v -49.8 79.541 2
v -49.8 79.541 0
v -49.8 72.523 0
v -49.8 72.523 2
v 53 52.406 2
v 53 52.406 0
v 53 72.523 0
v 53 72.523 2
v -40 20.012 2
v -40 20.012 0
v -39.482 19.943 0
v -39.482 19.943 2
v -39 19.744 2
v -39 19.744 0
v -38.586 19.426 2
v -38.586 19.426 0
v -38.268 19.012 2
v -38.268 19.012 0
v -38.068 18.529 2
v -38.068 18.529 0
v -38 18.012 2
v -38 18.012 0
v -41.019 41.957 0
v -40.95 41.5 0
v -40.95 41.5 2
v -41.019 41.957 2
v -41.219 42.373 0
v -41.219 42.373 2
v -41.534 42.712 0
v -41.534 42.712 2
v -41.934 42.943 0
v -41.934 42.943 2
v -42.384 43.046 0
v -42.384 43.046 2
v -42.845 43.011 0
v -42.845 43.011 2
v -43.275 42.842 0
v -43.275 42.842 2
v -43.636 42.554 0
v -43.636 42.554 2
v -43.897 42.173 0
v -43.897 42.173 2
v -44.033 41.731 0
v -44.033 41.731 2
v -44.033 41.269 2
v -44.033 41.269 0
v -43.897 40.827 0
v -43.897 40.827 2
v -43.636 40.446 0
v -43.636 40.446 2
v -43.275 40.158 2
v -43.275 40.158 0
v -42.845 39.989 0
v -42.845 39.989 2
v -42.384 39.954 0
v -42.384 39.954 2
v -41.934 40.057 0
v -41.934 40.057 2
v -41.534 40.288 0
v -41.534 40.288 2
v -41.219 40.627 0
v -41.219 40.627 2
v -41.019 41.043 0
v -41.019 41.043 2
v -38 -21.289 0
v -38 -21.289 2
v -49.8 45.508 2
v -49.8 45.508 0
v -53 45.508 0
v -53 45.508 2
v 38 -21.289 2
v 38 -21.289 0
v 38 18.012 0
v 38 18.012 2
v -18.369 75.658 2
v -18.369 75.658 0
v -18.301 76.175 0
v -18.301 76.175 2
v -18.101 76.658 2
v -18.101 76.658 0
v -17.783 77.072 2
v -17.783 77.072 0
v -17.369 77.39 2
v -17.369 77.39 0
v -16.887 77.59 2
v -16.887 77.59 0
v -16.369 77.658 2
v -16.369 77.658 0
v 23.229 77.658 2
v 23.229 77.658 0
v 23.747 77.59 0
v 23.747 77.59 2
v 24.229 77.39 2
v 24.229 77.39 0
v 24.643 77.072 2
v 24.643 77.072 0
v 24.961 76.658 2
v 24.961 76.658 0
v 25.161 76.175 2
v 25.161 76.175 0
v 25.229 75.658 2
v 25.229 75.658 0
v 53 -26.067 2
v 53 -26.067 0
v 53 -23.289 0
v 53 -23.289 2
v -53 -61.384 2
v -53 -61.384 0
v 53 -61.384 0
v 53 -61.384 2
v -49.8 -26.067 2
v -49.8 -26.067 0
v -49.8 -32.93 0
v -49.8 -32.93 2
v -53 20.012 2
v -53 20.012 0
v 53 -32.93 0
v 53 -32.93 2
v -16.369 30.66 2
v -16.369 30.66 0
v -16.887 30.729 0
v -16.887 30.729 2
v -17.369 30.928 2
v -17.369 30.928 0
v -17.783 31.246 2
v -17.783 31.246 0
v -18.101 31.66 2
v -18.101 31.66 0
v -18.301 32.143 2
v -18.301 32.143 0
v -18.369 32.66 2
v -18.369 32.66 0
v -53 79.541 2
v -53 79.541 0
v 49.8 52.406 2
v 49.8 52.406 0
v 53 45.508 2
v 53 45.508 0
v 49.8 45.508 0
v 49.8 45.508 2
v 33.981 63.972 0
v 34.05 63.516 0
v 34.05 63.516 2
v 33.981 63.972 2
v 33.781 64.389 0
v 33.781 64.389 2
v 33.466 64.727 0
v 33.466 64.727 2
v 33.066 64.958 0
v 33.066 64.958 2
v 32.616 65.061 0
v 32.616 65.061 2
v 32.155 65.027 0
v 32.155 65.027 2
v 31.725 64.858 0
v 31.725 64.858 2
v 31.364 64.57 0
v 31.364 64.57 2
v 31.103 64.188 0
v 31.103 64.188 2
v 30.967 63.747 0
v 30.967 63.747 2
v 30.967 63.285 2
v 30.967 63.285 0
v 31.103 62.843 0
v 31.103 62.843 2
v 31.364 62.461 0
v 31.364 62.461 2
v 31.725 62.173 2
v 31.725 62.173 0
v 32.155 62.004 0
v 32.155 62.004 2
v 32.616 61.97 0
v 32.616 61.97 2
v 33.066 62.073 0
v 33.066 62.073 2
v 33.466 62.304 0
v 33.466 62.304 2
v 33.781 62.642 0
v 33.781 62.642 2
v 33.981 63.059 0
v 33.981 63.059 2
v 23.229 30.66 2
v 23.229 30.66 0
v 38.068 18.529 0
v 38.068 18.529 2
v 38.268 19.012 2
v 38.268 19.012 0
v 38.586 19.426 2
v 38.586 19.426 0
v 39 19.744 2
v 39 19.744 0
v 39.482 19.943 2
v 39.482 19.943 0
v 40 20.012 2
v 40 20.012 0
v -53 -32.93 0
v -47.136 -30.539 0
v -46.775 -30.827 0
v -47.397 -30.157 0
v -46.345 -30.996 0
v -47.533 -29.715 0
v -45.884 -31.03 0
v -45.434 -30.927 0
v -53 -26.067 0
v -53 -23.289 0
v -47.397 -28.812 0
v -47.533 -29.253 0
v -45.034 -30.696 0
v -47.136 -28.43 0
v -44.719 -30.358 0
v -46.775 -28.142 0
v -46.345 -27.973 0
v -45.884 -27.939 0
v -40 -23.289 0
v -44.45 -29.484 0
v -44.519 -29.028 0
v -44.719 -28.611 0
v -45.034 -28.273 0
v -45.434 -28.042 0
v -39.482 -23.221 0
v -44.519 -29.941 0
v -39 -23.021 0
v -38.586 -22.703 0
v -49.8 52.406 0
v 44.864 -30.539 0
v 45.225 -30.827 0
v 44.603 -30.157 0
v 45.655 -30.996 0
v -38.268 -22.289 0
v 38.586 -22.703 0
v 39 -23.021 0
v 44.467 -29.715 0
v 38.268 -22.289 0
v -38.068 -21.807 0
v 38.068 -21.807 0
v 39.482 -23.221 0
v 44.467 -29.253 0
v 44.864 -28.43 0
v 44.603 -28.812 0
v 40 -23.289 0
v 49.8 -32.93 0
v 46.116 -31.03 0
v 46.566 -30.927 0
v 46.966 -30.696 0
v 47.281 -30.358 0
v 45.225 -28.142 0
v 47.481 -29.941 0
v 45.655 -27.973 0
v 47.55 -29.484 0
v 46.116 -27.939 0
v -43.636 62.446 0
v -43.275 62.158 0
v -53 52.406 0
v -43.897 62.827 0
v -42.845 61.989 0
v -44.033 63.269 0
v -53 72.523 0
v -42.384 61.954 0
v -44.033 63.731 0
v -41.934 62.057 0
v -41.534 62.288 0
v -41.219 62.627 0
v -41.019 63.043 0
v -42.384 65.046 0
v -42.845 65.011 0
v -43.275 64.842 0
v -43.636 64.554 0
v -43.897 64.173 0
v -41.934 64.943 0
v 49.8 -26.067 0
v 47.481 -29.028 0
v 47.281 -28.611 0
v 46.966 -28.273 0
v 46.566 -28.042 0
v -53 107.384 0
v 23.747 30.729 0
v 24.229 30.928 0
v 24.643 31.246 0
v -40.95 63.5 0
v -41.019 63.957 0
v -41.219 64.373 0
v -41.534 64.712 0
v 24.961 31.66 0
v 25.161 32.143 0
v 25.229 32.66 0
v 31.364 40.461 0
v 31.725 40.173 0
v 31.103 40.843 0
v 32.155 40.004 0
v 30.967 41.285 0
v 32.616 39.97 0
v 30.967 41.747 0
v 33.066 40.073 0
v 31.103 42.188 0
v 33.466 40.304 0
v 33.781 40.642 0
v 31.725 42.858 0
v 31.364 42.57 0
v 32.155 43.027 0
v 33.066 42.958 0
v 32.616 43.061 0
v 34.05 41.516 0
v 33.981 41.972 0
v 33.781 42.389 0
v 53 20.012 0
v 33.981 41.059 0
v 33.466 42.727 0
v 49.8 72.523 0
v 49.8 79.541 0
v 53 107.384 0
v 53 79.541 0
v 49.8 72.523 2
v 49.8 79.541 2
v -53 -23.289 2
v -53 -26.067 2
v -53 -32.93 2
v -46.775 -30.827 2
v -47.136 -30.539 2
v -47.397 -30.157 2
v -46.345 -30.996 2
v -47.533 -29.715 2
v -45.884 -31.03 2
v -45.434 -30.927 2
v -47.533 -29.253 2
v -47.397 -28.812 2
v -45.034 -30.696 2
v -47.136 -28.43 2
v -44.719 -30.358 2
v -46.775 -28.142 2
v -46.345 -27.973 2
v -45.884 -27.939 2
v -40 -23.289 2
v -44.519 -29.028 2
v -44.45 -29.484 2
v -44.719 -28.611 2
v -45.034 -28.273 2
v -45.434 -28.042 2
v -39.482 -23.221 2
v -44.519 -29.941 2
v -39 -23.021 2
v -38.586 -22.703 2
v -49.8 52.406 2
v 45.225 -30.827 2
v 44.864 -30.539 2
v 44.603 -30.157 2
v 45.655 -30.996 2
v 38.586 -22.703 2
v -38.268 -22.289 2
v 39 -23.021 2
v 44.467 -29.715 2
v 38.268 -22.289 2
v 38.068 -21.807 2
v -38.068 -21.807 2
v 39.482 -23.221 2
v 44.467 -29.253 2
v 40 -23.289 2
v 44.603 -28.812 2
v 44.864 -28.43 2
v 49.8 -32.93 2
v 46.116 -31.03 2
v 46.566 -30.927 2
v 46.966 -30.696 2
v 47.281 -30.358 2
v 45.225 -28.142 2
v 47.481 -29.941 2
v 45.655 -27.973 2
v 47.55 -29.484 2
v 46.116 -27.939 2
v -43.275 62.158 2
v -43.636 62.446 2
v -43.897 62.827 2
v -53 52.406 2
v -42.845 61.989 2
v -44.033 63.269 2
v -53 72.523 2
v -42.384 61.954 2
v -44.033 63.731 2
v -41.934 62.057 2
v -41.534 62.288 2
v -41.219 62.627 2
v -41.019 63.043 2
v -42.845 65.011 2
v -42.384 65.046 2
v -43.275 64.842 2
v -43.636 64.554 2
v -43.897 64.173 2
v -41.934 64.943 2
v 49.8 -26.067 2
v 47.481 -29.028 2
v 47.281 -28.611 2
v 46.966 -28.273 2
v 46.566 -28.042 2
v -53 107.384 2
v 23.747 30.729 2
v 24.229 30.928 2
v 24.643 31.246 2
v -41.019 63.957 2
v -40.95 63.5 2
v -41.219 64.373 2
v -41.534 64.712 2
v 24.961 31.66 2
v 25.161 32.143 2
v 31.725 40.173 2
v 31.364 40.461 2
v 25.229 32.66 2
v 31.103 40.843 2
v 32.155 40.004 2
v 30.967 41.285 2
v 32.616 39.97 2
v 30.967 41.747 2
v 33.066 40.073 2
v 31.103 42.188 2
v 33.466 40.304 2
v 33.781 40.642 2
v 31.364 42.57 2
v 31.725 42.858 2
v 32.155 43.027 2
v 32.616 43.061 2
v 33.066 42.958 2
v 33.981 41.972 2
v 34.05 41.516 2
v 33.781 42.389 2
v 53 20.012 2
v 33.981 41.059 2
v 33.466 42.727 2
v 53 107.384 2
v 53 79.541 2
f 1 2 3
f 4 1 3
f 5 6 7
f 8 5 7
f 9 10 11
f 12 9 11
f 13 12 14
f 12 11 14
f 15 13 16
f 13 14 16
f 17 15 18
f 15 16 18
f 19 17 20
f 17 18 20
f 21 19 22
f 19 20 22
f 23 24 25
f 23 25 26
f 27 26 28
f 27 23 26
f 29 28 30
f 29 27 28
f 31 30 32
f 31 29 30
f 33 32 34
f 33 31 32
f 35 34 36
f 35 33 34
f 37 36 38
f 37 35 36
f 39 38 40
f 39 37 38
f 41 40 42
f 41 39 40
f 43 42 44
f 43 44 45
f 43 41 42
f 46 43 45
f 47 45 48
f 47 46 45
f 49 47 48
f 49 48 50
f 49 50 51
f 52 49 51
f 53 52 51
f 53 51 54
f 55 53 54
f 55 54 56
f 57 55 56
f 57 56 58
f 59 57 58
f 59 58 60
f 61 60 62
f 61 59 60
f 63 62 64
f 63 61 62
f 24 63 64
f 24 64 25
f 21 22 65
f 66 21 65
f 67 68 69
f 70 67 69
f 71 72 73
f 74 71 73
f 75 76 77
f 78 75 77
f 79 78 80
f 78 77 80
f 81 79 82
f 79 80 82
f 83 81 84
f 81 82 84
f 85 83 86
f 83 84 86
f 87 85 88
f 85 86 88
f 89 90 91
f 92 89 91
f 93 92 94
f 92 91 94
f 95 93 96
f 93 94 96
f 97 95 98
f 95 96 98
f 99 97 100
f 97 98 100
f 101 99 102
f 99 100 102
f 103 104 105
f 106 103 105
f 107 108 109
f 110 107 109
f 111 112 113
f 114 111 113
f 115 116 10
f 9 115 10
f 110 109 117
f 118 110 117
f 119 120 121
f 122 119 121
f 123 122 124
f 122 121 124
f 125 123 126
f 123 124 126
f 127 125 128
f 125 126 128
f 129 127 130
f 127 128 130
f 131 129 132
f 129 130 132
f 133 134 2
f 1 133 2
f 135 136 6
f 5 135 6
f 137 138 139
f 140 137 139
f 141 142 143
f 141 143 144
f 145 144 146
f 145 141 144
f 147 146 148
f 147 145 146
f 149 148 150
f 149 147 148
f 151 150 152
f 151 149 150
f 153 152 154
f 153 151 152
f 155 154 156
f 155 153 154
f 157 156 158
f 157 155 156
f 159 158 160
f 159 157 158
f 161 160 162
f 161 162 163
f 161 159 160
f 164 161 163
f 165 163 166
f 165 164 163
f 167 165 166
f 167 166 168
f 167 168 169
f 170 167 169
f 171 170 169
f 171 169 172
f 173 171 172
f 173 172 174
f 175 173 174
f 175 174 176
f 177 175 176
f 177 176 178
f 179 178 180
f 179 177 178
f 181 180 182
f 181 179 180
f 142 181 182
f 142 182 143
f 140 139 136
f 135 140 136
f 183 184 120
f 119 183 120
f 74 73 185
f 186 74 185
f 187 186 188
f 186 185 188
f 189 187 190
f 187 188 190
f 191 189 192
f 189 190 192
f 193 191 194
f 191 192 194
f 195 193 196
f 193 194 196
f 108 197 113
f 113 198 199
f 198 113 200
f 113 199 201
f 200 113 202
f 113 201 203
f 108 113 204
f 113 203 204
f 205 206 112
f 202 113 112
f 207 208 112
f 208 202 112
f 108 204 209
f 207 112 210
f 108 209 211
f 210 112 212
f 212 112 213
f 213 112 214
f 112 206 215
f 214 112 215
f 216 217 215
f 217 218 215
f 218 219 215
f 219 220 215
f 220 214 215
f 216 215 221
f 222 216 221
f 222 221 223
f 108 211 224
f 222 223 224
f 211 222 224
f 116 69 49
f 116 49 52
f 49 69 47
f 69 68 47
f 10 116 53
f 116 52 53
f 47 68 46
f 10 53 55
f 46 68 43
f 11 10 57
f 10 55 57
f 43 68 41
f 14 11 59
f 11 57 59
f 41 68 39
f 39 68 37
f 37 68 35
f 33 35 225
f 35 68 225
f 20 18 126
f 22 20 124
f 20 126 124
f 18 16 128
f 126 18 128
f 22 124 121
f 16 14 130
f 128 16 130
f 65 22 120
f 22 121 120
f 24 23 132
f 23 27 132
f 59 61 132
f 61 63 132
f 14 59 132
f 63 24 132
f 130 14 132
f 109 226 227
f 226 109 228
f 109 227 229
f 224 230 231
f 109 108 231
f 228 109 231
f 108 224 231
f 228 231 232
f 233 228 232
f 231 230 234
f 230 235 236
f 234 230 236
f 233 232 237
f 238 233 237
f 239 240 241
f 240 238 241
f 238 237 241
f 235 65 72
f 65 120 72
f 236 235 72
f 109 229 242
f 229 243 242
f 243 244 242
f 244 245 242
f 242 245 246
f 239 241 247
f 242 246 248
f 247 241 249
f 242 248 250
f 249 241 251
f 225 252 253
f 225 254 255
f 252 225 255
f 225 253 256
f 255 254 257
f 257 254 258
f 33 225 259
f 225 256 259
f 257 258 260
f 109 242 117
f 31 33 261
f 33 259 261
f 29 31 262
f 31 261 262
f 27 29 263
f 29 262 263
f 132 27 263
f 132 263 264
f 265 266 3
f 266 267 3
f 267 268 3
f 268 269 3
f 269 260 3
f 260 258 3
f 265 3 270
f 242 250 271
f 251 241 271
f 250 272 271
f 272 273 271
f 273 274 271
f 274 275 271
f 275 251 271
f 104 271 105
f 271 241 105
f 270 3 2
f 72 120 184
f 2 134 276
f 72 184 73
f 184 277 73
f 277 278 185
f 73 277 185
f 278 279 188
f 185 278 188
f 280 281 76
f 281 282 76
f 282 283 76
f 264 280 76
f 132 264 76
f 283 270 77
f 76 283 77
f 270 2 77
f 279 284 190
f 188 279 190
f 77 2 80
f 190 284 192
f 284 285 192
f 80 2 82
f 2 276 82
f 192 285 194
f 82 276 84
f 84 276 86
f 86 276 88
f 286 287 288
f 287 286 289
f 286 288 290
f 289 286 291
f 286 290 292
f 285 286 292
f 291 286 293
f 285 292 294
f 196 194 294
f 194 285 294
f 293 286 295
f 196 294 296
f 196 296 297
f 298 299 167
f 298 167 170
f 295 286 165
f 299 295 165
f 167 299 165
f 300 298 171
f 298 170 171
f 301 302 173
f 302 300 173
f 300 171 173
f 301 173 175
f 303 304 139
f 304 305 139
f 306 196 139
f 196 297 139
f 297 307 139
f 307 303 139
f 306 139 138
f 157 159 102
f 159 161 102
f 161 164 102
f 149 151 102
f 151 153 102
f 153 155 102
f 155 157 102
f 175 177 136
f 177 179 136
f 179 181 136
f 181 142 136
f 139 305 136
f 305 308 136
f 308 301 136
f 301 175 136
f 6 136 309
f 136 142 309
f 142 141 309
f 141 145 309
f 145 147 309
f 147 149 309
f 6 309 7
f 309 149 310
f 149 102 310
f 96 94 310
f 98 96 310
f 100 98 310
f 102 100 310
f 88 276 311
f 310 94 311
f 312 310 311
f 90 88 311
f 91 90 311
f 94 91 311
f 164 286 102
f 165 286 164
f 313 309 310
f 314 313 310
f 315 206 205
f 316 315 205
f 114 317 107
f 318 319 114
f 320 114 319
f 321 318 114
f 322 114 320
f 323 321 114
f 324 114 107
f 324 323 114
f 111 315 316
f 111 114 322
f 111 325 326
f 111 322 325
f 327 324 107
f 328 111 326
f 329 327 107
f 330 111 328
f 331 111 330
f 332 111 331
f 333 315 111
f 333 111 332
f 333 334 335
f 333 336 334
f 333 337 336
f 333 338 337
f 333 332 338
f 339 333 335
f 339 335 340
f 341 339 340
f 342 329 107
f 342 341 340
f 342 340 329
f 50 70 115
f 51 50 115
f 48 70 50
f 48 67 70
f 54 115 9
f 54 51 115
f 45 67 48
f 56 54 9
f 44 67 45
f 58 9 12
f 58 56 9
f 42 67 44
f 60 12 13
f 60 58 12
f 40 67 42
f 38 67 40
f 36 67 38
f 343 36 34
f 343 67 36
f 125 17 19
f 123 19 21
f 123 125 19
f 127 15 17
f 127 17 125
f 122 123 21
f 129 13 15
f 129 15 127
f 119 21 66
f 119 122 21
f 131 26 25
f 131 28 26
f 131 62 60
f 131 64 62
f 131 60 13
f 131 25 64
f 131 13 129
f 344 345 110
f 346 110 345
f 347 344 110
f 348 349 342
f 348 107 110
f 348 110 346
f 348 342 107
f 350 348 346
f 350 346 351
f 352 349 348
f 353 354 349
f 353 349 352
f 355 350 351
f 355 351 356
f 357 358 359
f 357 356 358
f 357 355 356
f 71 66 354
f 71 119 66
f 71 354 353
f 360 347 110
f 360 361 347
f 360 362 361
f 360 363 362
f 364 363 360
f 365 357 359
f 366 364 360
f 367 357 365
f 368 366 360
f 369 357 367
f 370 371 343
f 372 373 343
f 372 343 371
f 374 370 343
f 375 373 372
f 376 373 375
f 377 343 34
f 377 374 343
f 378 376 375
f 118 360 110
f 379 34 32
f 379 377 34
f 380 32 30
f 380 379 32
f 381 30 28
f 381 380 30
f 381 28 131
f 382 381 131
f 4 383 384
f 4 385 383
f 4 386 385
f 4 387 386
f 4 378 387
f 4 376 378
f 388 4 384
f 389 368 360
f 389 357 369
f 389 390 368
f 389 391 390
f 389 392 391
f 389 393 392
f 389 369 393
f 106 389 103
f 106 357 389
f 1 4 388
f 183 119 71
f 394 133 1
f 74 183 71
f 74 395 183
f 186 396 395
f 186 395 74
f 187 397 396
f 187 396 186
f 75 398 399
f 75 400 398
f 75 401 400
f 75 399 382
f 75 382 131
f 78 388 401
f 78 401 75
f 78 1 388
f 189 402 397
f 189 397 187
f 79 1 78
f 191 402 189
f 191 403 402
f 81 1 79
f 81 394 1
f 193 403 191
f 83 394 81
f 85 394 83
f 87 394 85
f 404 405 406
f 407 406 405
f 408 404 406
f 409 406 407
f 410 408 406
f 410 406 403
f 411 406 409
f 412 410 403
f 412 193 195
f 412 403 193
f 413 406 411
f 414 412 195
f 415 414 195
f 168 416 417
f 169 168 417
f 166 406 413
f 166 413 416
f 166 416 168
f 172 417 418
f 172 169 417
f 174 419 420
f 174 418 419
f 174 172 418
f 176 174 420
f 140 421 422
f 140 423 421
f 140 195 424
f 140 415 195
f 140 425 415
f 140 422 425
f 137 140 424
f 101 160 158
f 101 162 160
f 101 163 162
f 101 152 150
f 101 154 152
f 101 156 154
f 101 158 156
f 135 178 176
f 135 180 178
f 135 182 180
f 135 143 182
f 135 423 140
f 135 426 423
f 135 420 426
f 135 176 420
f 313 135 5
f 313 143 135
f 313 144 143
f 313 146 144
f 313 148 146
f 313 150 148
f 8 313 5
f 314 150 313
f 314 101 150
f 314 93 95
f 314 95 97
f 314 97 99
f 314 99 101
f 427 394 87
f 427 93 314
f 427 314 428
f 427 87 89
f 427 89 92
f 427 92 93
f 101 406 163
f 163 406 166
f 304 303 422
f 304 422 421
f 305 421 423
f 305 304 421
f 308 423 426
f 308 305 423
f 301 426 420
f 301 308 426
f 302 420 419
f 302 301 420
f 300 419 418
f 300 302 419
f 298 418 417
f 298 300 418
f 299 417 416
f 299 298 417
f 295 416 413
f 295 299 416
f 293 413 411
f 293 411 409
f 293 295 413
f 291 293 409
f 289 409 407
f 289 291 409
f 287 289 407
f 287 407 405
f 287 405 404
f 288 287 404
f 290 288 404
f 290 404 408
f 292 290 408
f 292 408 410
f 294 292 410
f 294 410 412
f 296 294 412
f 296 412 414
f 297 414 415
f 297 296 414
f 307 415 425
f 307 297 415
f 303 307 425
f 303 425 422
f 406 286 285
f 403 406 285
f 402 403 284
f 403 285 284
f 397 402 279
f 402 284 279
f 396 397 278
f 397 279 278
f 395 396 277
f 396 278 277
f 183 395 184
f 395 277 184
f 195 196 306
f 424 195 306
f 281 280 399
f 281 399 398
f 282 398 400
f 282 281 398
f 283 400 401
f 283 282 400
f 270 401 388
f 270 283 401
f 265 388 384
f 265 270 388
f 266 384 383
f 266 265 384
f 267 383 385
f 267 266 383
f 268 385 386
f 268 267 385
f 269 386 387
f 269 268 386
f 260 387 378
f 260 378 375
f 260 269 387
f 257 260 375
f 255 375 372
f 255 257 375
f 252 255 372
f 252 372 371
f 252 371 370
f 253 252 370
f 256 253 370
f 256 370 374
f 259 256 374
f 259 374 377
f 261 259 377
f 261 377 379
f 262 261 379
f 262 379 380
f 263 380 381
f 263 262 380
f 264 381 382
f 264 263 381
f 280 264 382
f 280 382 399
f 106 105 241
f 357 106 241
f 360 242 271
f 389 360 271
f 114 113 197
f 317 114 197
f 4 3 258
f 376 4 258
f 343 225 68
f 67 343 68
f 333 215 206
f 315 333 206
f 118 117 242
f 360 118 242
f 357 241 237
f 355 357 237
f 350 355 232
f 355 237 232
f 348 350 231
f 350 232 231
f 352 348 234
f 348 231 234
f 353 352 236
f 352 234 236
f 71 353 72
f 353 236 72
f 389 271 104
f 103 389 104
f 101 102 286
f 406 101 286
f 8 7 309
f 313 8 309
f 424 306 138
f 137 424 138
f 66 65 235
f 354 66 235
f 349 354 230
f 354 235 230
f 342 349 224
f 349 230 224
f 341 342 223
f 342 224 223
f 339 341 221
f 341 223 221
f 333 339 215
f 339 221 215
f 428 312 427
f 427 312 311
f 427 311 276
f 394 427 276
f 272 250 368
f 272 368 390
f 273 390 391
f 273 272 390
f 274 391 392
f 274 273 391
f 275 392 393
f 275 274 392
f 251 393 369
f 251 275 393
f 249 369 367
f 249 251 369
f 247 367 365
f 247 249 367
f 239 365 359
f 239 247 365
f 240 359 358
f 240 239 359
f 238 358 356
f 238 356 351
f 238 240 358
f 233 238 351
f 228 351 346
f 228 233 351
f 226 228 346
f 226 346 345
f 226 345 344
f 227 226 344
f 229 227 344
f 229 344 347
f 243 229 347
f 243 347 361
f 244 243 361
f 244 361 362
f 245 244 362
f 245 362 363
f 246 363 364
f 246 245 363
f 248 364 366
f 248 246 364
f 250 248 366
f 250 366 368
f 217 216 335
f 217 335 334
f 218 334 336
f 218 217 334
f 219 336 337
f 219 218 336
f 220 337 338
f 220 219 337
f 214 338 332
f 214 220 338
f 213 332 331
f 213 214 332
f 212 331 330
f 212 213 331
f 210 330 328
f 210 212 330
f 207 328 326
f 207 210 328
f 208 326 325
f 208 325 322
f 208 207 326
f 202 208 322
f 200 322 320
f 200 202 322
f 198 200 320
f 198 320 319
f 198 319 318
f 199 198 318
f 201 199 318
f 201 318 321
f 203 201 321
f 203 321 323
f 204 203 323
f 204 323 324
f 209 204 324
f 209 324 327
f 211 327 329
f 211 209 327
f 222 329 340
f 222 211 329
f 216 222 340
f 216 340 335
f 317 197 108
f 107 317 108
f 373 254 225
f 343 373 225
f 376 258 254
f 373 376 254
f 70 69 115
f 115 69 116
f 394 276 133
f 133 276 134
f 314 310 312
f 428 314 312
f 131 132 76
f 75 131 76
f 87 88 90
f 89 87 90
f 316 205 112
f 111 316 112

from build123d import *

# Parameters (mm, degrees)
SKETCH_1_R      = 1.55
EXTRUDE_1_DEPTH = 2


with BuildPart() as part:
    # 草图1 → 凸台-拉伸1 (new body)
    with BuildSketch(Plane.XY):
        with BuildLine():
            Line((-53, 72.523086953), (-53, 52.405955819))
            Line((-53, 52.405955819), (-49.8, 52.405955819))
            Line((-49.8, 52.405955819), (-49.8, 45.507725731))
            Line((-49.8, 45.507725731), (-53, 45.507725731))
            Line((-53, 45.507725731), (-53, 20.011565656))
            Line((-53, 20.011565656), (-40, 20.011565656))
            ThreePointArc((-40, 20.011565656), (-38.585786438, 19.425779218), (-38, 18.011565656))
            Line((-38, 18.011565656), (-38, -21.289037005))
            ThreePointArc((-38, -21.289037005), (-38.585786438, -22.703250568), (-40, -23.289037005))
            Line((-40, -23.289037005), (-53, -23.289037005))
            Line((-53, -23.289037005), (-53, -26.067193504))
            Line((-53, -26.067193504), (-49.8, -26.067193504))
            Line((-49.8, -26.067193504), (-49.8, -32.930143701))
            Line((-49.8, -32.930143701), (-53, -32.930143701))
            Line((-53, -32.930143701), (-53, -61.384473154))
            Line((-53, -61.384473154), (53, -61.384473154))
            Line((53, -61.384473154), (53, -32.930143701))
            Line((53, -32.930143701), (49.8, -32.930143701))
            Line((49.8, -32.930143701), (49.8, -26.067193504))
            Line((49.8, -26.067193504), (53, -26.067193504))
            Line((53, -26.067193504), (53, -23.289037005))
            Line((53, -23.289037005), (40, -23.289037005))
            ThreePointArc((40, -23.289037005), (38.585786438, -22.703250568), (38, -21.289037005))
            Line((38, -21.289037005), (38, 18.011565656))
            ThreePointArc((38, 18.011565656), (38.585786438, 19.425779218), (40, 20.011565656))
            Line((40, 20.011565656), (53, 20.011565656))
            Line((53, 20.011565656), (53, 45.507725731))
            Line((53, 45.507725731), (49.8, 45.507725731))
            Line((49.8, 45.507725731), (49.8, 52.405955819))
            Line((49.8, 52.405955819), (53, 52.405955819))
            Line((53, 52.405955819), (53, 67.484473154))
            Line((53, 67.484473154), (53, 72.523086953))
            Line((53, 72.523086953), (49.8, 72.523086953))
            Line((49.8, 72.523086953), (49.8, 79.540910094))
            Line((49.8, 79.540910094), (53, 79.540910094))
            Line((53, 79.540910094), (53, 107.384473154))
            Line((53, 107.384473154), (-53, 107.384473154))
            Line((-53, 107.384473154), (-53, 79.540910094))
            Line((-53, 79.540910094), (-49.8, 79.540910094))
            Line((-49.8, 79.540910094), (-49.8, 72.523086953))
            Line((-49.8, 72.523086953), (-53, 72.523086953))
        make_face()
        with Locations((-42.5, 63.5)):
            Circle(SKETCH_1_R, mode=Mode.SUBTRACT)
        with Locations((32.5, 63.515526846)):
            Circle(SKETCH_1_R, mode=Mode.SUBTRACT)
        with Locations((-42.5, 41.5)):
            Circle(SKETCH_1_R, mode=Mode.SUBTRACT)
        with Locations((32.5, 41.515526846)):
            Circle(SKETCH_1_R, mode=Mode.SUBTRACT)
        with Locations((-46, -29.484473154)):
            Circle(SKETCH_1_R, mode=Mode.SUBTRACT)
        with Locations((46, -29.484473154)):
            Circle(SKETCH_1_R, mode=Mode.SUBTRACT)
        with BuildLine():
            Line((-16.369193533, 77.65782048), (23.228994882, 77.65782048))
            ThreePointArc((23.228994882, 77.65782048), (24.643208444, 77.072034042), (25.228994882, 75.65782048))
            Line((25.228994882, 75.65782048), (25.228994882, 32.660489145))
            ThreePointArc((25.228994882, 32.660489145), (24.643208444, 31.246275583), (23.228994882, 30.660489145))
            Line((23.228994882, 30.660489145), (-16.369193533, 30.660489145))
            ThreePointArc((-16.369193533, 30.660489145), (-17.783407096, 31.246275583), (-18.369193533, 32.660489145))
            Line((-18.369193533, 32.660489145), (-18.369193533, 75.65782048))
            ThreePointArc((-18.369193533, 75.65782048), (-17.783407096, 77.072034042), (-16.369193533, 77.65782048))
        make_face(mode=Mode.SUBTRACT)
    extrude(amount=EXTRUDE_1_DEPTH)


solid = part.part
